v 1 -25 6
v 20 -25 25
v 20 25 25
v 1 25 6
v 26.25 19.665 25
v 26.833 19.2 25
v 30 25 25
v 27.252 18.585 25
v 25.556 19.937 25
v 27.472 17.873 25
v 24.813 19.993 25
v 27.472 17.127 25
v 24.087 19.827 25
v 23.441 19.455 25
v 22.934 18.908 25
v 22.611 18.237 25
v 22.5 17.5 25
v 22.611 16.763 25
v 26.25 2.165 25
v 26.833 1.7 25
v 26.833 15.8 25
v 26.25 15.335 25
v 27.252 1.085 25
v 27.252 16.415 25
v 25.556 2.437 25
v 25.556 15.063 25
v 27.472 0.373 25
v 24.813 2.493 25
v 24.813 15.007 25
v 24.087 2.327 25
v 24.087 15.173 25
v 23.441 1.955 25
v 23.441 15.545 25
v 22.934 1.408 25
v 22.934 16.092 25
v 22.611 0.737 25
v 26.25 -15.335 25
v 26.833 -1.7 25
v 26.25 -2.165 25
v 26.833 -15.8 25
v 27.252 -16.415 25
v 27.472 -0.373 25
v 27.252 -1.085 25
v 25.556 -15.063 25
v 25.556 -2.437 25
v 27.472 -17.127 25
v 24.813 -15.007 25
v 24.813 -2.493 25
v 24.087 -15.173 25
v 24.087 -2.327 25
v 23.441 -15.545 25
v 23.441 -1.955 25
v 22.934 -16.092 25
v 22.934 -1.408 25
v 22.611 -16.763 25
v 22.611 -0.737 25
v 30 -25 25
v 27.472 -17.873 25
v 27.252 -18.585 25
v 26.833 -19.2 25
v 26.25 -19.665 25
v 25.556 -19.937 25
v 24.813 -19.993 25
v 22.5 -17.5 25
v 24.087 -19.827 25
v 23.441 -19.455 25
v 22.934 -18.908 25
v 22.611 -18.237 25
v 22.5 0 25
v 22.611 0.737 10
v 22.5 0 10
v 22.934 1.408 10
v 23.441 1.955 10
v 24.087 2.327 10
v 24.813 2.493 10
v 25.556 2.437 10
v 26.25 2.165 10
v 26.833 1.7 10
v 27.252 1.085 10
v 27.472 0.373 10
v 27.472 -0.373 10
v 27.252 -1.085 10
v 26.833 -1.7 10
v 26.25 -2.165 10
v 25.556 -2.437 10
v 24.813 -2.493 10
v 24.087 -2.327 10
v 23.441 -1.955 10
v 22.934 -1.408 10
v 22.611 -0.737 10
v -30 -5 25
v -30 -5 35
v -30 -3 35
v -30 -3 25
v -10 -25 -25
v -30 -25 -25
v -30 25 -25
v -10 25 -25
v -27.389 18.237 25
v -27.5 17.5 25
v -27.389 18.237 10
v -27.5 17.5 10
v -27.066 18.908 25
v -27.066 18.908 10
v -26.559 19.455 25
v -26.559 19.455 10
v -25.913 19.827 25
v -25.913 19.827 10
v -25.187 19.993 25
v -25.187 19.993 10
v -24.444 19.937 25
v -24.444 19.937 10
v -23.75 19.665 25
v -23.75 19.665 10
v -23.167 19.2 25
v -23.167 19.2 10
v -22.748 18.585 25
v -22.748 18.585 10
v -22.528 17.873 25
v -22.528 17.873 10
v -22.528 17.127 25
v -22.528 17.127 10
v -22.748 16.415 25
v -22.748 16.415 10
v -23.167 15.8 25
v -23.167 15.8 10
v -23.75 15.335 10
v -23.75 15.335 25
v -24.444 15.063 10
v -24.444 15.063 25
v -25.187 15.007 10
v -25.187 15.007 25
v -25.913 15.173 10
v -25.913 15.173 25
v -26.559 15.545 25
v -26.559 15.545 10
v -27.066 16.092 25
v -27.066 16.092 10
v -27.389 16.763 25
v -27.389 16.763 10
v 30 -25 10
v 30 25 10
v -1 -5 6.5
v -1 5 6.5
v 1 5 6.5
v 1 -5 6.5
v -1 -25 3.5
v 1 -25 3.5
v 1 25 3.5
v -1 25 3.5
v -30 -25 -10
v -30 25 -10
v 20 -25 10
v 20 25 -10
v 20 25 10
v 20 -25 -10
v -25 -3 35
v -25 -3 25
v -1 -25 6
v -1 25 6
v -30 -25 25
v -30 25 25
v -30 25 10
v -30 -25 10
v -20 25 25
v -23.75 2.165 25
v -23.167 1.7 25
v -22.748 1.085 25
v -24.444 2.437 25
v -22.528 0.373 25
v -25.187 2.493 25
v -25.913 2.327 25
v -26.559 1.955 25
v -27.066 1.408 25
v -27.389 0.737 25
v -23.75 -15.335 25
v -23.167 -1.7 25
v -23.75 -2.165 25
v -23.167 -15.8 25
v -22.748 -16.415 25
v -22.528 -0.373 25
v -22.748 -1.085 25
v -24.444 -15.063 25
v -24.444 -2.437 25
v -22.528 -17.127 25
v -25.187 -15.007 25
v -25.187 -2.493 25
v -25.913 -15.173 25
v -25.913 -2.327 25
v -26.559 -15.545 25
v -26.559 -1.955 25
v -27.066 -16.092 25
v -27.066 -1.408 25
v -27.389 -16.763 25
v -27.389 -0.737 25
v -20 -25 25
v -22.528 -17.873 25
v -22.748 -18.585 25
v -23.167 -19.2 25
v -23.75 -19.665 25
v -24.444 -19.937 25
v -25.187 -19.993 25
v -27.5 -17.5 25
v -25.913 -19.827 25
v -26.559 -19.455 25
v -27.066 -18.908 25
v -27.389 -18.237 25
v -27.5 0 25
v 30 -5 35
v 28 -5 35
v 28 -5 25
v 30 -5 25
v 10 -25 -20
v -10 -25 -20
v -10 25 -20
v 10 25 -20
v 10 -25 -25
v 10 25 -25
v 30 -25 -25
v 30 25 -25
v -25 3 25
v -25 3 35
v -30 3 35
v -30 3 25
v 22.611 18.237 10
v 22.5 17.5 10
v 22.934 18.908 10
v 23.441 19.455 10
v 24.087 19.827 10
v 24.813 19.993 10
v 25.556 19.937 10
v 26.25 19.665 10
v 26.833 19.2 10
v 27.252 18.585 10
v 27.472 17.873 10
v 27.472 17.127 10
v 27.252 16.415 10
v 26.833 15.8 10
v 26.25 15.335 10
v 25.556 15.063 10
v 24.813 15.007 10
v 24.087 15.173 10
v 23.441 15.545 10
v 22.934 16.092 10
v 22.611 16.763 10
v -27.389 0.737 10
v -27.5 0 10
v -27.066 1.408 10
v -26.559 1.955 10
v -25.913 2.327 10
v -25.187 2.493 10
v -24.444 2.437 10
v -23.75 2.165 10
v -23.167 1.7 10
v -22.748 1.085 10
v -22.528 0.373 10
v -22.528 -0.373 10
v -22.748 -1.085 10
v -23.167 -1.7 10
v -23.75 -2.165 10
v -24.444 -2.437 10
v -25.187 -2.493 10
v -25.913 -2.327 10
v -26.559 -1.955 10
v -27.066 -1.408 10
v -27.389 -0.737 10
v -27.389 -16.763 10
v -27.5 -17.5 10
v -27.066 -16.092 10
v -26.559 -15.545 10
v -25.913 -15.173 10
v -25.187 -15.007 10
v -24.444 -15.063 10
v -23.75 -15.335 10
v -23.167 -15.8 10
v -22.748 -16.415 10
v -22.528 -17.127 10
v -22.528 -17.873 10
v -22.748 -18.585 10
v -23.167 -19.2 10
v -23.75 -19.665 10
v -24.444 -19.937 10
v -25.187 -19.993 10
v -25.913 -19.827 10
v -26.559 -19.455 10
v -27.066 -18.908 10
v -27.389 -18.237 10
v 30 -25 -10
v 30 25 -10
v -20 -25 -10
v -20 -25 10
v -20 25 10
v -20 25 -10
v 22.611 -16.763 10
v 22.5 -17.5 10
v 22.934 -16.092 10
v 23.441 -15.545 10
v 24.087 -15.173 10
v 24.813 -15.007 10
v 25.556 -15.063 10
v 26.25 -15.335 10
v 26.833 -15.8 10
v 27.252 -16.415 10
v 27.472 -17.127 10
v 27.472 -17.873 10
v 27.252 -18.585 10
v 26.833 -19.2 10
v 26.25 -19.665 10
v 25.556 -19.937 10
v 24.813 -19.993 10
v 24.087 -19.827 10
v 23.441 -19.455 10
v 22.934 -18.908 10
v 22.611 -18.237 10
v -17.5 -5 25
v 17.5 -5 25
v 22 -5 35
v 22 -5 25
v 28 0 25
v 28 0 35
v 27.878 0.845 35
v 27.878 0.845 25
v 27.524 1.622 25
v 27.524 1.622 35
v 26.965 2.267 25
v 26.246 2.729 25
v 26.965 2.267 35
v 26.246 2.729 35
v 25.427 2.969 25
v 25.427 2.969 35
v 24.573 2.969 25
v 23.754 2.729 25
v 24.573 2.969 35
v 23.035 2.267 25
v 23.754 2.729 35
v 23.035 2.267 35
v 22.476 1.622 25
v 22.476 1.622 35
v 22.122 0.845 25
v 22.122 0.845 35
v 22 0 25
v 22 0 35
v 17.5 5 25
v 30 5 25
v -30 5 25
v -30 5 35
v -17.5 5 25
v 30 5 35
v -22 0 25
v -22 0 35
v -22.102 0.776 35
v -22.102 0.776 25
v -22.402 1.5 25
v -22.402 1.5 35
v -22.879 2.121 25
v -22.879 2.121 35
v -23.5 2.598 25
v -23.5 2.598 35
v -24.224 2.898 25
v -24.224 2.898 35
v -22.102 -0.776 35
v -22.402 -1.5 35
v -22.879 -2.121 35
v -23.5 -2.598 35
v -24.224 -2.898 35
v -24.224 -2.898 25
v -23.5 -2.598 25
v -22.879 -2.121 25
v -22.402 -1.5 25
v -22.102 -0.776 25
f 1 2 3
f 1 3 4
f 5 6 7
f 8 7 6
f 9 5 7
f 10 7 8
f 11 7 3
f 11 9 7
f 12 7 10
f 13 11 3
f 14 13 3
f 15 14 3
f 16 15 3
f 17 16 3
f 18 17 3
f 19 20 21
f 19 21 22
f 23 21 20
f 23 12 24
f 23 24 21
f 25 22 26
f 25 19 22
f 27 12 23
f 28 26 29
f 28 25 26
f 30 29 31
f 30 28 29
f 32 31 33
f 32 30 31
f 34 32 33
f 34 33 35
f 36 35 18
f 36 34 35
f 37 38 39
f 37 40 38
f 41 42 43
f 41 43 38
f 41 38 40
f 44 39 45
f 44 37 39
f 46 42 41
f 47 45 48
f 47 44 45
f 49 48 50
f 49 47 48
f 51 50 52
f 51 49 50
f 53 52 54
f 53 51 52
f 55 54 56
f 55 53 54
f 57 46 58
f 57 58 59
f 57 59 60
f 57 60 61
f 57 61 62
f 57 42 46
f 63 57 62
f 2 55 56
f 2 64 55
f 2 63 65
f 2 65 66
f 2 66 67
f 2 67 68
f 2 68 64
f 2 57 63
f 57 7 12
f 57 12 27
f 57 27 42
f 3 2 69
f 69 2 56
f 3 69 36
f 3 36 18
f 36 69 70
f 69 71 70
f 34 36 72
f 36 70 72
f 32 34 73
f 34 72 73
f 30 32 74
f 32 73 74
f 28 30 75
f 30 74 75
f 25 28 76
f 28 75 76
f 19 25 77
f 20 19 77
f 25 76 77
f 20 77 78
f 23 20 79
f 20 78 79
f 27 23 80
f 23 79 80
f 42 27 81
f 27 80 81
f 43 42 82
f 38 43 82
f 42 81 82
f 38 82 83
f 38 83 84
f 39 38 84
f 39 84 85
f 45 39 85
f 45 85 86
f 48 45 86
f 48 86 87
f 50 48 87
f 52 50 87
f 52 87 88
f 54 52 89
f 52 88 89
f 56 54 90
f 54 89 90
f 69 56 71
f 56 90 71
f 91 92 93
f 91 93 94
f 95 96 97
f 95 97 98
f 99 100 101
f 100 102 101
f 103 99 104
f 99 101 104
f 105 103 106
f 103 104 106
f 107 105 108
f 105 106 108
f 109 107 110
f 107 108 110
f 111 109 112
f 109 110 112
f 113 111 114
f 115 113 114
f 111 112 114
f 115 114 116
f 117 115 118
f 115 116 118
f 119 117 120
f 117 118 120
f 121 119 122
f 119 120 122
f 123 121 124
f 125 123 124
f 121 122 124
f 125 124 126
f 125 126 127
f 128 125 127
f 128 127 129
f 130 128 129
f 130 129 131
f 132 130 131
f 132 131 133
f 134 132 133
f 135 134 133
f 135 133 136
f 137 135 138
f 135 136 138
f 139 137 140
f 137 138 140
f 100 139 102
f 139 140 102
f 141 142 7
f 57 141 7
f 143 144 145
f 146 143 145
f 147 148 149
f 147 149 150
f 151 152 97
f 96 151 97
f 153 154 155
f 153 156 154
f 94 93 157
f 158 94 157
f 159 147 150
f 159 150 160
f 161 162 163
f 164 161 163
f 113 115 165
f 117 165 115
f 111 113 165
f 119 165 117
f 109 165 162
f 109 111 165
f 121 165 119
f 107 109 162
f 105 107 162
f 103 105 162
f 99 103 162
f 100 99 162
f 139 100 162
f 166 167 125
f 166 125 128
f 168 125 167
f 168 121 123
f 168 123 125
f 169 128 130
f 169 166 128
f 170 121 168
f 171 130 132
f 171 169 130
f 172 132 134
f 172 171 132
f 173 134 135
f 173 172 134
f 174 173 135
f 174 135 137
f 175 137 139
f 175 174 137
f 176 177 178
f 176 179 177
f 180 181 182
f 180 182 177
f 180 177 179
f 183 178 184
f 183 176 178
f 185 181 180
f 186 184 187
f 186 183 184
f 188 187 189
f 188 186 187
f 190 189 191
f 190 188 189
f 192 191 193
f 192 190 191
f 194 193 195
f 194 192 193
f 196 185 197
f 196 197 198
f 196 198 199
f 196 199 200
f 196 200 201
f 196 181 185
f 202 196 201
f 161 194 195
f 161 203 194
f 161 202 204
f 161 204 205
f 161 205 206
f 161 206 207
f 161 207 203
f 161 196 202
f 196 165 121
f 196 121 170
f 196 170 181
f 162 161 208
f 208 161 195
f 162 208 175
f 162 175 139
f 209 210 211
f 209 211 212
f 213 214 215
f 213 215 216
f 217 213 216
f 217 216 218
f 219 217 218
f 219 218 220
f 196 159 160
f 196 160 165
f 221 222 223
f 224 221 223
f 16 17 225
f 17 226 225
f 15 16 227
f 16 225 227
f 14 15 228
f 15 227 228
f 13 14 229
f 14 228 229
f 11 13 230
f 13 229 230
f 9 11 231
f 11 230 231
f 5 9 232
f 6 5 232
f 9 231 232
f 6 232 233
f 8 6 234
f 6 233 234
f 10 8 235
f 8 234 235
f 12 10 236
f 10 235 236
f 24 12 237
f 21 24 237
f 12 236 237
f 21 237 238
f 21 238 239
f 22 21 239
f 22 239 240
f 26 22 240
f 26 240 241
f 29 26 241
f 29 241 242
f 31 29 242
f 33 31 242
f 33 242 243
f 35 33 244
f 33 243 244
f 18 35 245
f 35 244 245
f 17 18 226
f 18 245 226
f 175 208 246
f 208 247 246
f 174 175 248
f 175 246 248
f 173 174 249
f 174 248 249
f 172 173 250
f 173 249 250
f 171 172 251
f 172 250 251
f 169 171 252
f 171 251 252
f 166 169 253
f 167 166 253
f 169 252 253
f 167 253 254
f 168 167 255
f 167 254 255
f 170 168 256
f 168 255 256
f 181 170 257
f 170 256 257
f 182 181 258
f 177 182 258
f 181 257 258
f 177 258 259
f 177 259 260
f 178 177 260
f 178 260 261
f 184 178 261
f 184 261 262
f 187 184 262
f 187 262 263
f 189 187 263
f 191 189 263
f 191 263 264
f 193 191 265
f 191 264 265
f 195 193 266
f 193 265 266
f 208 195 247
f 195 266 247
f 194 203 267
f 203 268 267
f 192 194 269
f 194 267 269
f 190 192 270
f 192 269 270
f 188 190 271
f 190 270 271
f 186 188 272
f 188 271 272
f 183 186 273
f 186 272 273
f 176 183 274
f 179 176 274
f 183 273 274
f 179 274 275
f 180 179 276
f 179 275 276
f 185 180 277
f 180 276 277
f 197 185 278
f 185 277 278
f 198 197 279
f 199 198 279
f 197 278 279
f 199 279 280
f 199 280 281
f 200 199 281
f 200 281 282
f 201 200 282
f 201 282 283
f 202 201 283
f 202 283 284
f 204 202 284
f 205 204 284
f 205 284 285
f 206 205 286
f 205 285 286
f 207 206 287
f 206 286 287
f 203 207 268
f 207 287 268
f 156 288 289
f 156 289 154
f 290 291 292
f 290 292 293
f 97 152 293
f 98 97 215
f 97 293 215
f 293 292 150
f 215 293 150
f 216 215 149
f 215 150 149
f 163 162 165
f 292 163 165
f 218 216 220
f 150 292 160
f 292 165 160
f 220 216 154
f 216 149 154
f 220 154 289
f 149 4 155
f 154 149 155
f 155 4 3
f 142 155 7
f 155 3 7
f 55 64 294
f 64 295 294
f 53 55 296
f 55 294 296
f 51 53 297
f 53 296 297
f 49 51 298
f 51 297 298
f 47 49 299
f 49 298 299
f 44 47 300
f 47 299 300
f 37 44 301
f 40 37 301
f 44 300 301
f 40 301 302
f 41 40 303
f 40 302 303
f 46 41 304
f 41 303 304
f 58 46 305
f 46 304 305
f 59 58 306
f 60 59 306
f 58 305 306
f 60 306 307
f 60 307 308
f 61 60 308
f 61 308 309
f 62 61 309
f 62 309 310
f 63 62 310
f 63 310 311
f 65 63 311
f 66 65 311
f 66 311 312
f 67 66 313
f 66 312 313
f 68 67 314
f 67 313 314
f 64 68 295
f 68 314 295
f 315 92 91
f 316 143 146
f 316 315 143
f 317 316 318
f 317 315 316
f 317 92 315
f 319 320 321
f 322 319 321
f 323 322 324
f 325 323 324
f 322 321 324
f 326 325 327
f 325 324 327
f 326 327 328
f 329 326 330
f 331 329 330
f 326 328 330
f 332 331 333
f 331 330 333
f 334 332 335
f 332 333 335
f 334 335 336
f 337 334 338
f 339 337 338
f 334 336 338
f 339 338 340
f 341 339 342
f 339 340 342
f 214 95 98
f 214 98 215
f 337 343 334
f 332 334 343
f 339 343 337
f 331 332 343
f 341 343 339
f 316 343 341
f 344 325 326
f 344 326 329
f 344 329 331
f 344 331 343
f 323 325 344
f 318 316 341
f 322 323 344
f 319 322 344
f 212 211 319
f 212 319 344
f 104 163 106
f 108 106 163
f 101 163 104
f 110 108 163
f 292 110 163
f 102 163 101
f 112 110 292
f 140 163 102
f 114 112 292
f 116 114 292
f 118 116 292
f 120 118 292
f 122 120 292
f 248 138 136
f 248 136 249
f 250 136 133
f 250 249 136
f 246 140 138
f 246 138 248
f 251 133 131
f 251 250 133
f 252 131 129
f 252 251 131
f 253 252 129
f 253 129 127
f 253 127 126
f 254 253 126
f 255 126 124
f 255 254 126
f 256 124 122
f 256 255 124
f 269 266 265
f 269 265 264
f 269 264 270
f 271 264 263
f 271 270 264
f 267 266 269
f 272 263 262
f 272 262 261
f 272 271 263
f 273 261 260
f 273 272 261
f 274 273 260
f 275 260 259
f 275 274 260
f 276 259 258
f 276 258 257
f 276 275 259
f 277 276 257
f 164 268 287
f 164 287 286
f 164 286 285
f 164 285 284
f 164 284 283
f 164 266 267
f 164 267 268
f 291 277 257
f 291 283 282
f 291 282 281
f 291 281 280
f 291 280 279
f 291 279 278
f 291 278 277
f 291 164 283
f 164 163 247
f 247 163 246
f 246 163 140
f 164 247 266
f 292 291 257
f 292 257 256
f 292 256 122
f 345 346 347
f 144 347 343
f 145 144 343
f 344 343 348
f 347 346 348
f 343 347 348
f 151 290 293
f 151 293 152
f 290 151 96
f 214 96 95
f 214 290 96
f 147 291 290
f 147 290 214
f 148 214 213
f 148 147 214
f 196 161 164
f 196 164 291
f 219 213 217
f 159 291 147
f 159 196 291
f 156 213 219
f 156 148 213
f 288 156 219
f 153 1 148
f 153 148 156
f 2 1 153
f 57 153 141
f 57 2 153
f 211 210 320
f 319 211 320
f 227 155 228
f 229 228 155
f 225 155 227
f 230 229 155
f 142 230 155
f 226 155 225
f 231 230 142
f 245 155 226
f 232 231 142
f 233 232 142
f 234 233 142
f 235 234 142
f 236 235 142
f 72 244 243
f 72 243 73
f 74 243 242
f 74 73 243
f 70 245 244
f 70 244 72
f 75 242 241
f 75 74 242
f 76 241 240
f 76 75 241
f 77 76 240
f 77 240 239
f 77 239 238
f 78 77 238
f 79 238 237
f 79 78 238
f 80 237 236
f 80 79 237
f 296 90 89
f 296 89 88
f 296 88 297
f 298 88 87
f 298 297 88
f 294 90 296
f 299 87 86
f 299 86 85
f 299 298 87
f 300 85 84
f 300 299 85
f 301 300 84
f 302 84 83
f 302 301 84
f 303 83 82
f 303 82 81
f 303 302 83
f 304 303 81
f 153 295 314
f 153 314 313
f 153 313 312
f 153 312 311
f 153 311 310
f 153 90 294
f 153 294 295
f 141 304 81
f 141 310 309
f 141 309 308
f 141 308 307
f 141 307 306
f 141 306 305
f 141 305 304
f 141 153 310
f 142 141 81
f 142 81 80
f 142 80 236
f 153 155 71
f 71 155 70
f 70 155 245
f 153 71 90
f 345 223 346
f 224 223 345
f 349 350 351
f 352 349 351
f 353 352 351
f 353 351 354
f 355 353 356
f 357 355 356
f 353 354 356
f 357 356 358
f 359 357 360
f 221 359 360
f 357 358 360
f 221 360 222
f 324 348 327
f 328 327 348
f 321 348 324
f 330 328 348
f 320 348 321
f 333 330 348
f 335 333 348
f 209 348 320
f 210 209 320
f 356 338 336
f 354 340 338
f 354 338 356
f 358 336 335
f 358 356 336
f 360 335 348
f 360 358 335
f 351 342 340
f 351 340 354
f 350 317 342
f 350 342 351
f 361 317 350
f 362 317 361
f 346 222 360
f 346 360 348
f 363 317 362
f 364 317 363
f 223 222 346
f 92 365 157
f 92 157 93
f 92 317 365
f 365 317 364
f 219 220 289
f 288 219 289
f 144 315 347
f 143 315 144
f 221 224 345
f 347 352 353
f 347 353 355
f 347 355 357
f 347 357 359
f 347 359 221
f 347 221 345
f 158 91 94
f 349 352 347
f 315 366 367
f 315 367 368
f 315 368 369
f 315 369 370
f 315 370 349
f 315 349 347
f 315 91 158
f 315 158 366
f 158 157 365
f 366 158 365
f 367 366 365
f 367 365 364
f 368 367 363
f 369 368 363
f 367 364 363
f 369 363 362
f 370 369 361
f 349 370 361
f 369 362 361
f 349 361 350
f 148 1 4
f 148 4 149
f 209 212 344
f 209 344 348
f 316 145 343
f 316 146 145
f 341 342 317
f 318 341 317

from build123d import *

# Parameters (mm, degrees)
F1_DEPTH = 25
F3_D     = 5
F3_DEPTH = 15
F3_TIP   = 1.5021515476
F4_DEPTH = 5
F6_DEPTH = 60.001


with BuildPart() as f1:
    # F0 (on Front) → F1 (new body, symmetric)
    with BuildSketch(Plane.XZ):
        Polygon((30, 10), (30, 25), (20, 25), (1, 6), (1, 3.5), (-1, 3.5), (-1, 6), (-20, 25), (-30, 25), (-30, 10), (-20, 10), (-20, -10), (-30, -10), (-30, -25), (-10, -25), (-10, -20), (10, -20), (10, -25), (30, -25), (30, -10), (20, -10), (20, 10), align=None)
    extrude(amount=F1_DEPTH, both=True)

    # F3
    with Locations(Plane.XY.offset(25)):
        with Locations((-25, -17.5), (-25, 0), (-25, 17.5), (25, -17.5), (25, 0), (25, 17.5)):
            Hole(F3_D / 2, depth=F3_DEPTH)
            with Locations((0, 0, -(F3_DEPTH + F3_TIP / 2))):  # 118° drill point
                Cone(0, F3_D / 2, F3_TIP, mode=Mode.SUBTRACT)


with BuildPart() as f4:
    # F0 (on Front) → F4 (new body, symmetric)
    with BuildSketch(Plane.XZ):
        Polygon((1, 6.5), (17.5, 25), (-17.5, 25), (-1, 6.5), align=None)
        Polygon((20, 25), (30, 25), (30, 35), (-30, 35), (-30, 25), (-20, 25), (-17.5, 25), (17.5, 25), align=None)
    extrude(amount=F4_DEPTH, both=True)

    # F5 (on face) → F6 (cut, through all)
    with BuildSketch(Plane.XY.offset(35)):
        with BuildLine():
            ThreePointArc((-25, -3), (-22.8786796564, -2.1213203436), (-22, 0))
            ThreePointArc((-22, 0), (-22.8786796564, 2.1213203436), (-25, 3))
            ThreePointArc((-25, 3), (-28, 0), (-25, -3))
        make_face()
        with BuildLine():
            ThreePointArc((-25, -3), (-28, 0), (-25, 3))
            Line((-25, 3), (-30, 3))
            Line((-30, 3), (-30, -3))
            Line((-30, -3), (-25, -3))
        make_face()
        with BuildLine():
            ThreePointArc((28, 0), (25, 3), (22, 0))
            ThreePointArc((22, 0), (25, -3), (28, 0))
        make_face()
        with BuildLine():
            Line((22, 0), (22, -5))
            Line((22, -5), (28, -5))
            Line((28, -5), (28, 0))
            ThreePointArc((28, 0), (25, -3), (22, 0))
        make_face()
    extrude(amount=-F6_DEPTH, mode=Mode.SUBTRACT)


solid = Compound([f1.part, f4.part])
